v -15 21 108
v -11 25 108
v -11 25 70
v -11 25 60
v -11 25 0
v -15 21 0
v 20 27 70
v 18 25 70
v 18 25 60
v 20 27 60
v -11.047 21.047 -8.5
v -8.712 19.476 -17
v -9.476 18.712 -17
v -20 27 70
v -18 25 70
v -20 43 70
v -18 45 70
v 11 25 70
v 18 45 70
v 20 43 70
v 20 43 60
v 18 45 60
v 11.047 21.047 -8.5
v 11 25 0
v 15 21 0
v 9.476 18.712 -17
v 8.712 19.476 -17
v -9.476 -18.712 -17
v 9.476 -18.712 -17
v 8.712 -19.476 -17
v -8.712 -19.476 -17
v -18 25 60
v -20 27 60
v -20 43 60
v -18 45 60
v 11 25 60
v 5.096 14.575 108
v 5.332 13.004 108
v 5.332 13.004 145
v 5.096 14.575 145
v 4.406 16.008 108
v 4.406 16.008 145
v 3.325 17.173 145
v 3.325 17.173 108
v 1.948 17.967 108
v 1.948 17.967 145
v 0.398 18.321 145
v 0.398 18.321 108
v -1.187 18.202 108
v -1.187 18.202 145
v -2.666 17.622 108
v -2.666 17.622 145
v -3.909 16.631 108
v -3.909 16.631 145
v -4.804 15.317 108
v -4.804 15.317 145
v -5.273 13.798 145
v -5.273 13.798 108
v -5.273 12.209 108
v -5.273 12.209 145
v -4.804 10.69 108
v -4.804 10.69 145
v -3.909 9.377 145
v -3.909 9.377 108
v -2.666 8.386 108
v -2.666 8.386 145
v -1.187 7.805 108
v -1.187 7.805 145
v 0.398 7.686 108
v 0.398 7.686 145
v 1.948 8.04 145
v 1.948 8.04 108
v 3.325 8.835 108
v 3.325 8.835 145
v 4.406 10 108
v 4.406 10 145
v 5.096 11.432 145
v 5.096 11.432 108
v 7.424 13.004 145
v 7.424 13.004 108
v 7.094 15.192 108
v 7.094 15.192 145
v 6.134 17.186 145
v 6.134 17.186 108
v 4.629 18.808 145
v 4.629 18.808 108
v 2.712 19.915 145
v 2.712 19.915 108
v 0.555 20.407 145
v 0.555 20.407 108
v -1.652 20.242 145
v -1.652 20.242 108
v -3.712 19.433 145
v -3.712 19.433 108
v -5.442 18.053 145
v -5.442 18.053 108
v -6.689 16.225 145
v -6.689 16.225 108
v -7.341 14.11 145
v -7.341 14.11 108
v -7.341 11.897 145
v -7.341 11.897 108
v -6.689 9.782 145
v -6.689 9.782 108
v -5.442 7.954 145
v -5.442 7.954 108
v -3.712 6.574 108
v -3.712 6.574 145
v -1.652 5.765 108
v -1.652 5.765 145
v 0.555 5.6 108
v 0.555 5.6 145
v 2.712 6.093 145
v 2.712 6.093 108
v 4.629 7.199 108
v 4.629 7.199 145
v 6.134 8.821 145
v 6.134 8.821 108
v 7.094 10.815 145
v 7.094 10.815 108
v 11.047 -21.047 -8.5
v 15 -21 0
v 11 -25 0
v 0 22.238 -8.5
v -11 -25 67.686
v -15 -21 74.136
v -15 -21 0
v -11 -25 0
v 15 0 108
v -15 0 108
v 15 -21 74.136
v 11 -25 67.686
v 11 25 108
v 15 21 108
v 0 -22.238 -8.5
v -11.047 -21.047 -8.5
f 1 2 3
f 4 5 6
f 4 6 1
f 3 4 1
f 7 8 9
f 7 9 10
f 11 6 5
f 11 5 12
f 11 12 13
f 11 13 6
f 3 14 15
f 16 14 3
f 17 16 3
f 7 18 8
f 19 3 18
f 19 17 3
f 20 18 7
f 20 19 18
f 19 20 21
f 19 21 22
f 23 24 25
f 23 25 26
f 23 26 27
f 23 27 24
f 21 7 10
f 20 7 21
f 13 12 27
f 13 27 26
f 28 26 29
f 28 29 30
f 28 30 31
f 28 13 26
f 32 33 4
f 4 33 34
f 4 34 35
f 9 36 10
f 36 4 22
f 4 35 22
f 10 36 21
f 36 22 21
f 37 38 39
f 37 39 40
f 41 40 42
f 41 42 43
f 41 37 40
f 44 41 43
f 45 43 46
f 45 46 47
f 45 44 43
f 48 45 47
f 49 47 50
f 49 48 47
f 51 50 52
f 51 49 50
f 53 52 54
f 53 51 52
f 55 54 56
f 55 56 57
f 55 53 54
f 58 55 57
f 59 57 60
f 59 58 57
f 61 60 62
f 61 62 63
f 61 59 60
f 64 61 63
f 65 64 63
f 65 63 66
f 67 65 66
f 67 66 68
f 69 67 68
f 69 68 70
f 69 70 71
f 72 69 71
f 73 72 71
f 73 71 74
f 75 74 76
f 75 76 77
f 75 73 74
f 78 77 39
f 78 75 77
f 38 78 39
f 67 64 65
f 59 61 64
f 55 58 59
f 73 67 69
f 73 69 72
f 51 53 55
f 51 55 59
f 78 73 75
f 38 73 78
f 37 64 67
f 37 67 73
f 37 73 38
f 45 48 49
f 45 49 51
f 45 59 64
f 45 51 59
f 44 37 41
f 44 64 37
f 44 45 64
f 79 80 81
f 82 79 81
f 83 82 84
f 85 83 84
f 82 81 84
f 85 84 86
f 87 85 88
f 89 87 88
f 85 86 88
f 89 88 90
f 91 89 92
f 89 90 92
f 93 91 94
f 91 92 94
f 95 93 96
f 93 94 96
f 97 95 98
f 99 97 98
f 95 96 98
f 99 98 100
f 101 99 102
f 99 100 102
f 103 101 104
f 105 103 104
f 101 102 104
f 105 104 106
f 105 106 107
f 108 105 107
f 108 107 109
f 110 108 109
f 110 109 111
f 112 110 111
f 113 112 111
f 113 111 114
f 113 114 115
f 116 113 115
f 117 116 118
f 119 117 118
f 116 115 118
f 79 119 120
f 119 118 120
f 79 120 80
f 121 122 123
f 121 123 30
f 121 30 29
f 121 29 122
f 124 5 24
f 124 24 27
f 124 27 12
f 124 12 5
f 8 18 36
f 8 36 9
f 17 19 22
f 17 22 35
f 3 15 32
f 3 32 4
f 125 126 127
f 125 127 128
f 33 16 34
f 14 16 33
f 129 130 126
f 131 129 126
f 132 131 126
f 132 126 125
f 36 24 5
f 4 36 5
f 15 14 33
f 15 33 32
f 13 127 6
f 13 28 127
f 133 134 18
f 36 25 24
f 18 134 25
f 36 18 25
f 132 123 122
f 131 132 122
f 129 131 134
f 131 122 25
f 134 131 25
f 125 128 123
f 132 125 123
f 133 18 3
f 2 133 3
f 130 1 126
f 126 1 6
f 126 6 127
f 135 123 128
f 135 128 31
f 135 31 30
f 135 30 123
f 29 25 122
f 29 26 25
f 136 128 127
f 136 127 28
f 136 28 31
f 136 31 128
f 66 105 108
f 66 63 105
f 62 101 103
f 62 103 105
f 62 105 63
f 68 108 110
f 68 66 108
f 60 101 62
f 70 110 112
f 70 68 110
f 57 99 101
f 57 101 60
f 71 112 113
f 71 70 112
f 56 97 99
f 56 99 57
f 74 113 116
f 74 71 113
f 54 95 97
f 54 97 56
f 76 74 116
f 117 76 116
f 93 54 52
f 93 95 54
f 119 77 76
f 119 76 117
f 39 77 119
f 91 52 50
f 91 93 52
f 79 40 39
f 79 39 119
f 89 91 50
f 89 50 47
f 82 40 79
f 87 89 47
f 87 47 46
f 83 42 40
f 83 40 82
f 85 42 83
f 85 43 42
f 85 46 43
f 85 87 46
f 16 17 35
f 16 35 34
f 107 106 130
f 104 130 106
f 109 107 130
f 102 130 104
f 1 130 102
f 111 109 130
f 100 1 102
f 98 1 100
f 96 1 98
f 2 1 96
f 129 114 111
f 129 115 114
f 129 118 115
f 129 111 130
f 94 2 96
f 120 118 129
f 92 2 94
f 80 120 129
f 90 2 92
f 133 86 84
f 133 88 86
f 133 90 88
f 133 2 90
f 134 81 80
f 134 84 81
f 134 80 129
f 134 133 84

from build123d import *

# Parameters (mm, degrees)
BOSS_EXTRUDE1_DEPTH = 108
SKETCH2_R           = 7.424298736
SKETCH2_R_2         = 5.332436938
BOSS_EXTRUDE2_DEPTH = 37
BOSS_EXTRUDE3_DEPTH = 10
CUT_EXTRUDE1_REACH  = 157.804
BOSS_EXTRUDE5_DEPTH = 17
BOSS_EXTRUDE5_TAPER = 18


with BuildPart() as part:
    # Sketch1 → Boss-Extrude1 (new body)
    with BuildSketch(Plane.XY):
        Polygon((-11, 25), (-15, 21), (-15, -21), (-11, -25), (11, -25), (15, -21), (15, 21), (11, 25), align=None)
    extrude(amount=BOSS_EXTRUDE1_DEPTH)

    # Sketch2 → Boss-Extrude2 (add)
    with BuildSketch(Plane.XY.offset(108)):
        with Locations((0, 13.003641212)):
            Circle(SKETCH2_R)
        with Locations((0, 13.003641212)):
            Circle(SKETCH2_R_2, mode=Mode.SUBTRACT)
    extrude(amount=BOSS_EXTRUDE2_DEPTH)

    # Sketch3 → Boss-Extrude3 (add)
    with BuildSketch(Plane(origin=(0, 0, 70), x_dir=(-1, 0, 0), z_dir=(0, 0, -1))):
        Polygon((-18, 45), (18, 45), (20, 43), (20, 27), (18, 25), (-18, 25), (-20, 27), (-20, 43), align=None)
    extrude(amount=BOSS_EXTRUDE3_DEPTH)

    # Sketch4 → Cut-Extrude1 (cut, up to next)
    with BuildSketch(Plane.ZY.offset(15), mode=Mode.PRIVATE) as cut_extrude1_sk1:
        Polygon((108, 0), (67.685614015, -25), (108, -25), align=None)
    cut_extrude1_tool1 = extrude(cut_extrude1_sk1.sketch, amount=-CUT_EXTRUDE1_REACH, mode=Mode.PRIVATE) & part.part
    add(cut_extrude1_tool1.solids().sort_by_distance((-15, -16.666667, 94.561871))[0], mode=Mode.SUBTRACT)

    # Sketch5 → Boss-Extrude5 (add)
    with BuildSketch(Plane(origin=(-28.517335014, 0, 0), x_dir=(-1, 0, 0), z_dir=(0, 0, -1))):
        Polygon((-43.517335014, 21), (-43.517335014, -21), (-39.517335014, -25), (-17.517335014, -25), (-13.517335014, -21), (-13.517335014, 21), (-17.517335014, 25), (-39.517335014, 25), align=None)
    extrude(amount=BOSS_EXTRUDE5_DEPTH, taper=BOSS_EXTRUDE5_TAPER)


solid = part.part
